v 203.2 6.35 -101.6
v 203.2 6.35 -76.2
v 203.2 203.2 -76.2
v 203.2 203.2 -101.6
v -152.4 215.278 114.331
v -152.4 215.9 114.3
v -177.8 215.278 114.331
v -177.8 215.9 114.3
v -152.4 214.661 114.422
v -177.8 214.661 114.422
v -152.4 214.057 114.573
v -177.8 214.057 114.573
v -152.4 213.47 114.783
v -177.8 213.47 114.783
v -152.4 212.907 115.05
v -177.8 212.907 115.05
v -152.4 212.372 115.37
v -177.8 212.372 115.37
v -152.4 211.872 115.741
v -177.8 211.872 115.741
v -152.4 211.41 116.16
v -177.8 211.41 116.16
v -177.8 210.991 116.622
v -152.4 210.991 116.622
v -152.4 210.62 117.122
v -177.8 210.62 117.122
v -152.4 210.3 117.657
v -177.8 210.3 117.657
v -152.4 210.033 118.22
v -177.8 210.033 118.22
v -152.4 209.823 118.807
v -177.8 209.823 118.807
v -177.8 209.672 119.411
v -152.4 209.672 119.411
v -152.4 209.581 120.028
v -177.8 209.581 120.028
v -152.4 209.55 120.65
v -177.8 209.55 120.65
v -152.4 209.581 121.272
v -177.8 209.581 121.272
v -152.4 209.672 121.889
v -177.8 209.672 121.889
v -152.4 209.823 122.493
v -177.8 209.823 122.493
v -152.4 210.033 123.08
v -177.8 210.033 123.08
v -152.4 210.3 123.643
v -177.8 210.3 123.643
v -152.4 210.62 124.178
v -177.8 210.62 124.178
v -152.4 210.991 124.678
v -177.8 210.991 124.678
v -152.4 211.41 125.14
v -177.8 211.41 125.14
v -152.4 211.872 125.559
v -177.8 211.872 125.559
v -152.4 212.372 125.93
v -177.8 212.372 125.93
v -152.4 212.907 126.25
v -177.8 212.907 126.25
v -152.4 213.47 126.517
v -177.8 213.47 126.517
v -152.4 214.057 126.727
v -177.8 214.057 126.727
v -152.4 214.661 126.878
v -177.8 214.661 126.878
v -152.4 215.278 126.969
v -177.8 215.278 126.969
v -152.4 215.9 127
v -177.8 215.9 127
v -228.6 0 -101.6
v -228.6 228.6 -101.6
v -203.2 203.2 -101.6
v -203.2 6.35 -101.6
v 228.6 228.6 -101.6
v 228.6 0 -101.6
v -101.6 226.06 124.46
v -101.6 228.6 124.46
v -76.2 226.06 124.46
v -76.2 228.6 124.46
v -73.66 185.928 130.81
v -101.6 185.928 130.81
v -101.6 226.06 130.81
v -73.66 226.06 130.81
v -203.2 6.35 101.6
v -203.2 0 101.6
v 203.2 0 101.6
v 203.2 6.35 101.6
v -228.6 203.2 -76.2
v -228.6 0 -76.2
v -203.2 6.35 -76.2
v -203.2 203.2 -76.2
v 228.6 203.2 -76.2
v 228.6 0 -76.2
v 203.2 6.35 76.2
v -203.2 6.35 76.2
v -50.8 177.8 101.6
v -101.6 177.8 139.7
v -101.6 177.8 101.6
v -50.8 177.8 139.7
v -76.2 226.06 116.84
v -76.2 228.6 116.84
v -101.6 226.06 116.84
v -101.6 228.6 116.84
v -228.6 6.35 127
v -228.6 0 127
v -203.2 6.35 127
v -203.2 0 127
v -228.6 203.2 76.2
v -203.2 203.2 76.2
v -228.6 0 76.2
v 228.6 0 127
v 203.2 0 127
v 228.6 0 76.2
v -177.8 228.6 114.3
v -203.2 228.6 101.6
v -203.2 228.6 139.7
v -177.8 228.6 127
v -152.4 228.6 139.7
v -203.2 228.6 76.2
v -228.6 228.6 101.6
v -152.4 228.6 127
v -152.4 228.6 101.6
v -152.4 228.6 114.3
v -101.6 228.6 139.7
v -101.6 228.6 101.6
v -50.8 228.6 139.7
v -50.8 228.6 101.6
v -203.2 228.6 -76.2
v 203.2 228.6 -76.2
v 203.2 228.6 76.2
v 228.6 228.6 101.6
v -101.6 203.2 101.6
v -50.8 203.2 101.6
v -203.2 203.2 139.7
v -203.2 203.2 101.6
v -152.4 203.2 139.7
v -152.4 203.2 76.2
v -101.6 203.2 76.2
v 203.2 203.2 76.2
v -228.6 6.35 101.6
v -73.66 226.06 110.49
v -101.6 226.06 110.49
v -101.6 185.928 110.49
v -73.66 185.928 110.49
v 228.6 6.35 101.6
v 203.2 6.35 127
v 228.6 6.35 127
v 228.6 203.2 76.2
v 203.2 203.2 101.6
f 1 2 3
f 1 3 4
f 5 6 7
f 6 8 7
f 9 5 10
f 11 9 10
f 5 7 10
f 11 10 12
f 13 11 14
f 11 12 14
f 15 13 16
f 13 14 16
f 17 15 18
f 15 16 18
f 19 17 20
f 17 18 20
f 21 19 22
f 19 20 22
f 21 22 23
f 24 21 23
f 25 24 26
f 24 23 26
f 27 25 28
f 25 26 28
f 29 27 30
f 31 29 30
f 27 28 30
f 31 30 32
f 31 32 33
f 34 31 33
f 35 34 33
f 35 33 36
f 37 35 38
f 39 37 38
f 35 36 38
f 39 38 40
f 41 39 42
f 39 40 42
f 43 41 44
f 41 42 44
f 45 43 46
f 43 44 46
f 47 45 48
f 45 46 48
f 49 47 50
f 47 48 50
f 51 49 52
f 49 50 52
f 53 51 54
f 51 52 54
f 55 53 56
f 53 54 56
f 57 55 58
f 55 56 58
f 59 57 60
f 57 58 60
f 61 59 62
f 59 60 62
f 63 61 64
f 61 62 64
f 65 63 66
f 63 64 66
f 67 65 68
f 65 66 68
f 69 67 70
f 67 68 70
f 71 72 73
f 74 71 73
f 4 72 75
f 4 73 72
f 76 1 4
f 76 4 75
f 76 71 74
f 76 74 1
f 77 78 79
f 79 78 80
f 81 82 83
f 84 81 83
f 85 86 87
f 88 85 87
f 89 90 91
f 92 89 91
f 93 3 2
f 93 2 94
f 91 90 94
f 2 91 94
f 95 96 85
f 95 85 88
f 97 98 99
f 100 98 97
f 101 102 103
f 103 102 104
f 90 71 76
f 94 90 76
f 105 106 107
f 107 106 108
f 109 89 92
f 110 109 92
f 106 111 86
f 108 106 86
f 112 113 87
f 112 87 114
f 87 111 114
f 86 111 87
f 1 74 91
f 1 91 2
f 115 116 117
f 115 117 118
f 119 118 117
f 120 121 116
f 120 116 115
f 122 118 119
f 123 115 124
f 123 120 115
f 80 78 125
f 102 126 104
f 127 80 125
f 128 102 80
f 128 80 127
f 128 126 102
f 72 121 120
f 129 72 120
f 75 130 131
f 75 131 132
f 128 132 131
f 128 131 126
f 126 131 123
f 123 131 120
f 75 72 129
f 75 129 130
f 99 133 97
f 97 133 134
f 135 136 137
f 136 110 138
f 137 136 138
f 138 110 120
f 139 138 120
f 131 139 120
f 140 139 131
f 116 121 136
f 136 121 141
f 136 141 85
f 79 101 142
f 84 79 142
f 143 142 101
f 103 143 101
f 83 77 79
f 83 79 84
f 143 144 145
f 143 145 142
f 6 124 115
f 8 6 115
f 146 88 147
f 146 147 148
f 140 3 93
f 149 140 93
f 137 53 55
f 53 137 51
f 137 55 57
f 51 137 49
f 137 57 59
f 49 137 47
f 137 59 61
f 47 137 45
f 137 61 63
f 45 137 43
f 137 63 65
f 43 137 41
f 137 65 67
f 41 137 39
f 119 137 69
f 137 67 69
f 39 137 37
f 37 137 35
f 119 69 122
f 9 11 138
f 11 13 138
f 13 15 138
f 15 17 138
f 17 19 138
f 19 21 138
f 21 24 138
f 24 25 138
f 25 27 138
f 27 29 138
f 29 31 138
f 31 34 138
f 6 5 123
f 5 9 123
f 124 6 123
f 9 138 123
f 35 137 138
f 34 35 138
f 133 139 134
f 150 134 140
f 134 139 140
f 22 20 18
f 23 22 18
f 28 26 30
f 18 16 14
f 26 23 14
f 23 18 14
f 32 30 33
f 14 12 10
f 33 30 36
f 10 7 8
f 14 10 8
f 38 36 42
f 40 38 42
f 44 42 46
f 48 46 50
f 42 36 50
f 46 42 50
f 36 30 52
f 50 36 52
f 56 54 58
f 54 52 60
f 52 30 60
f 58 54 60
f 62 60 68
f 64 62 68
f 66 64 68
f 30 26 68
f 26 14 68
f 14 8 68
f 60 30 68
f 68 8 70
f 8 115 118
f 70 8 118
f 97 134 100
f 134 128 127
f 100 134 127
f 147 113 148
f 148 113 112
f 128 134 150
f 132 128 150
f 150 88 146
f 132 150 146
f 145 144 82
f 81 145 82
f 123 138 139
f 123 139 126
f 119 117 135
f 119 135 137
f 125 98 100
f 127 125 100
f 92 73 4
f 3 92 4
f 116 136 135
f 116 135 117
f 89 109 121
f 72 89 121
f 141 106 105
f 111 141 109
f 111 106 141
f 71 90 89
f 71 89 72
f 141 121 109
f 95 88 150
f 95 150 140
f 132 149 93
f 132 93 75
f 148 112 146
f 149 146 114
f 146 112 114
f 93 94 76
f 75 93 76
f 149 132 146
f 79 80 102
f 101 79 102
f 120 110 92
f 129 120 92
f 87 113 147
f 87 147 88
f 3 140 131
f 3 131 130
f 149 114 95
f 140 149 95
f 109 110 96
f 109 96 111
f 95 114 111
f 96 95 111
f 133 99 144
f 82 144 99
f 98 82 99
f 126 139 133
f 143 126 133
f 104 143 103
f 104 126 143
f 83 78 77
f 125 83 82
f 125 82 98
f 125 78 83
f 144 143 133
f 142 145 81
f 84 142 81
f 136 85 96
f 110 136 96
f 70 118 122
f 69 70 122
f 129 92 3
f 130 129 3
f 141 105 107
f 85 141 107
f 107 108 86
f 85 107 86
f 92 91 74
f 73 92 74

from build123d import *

# Parameters (mm, degrees)
SKETCH1_W                      = 25.4
SKETCH1_H                      = 25.4
SKETCH1_W_2                    = 406.4
BOSS_EXTRUDE1_DEPTH            = 6.35
SKETCH1_4_W                    = 25.4
SKETCH1_4_H                    = 25.4
BOSS_EXTRUDE2_DEPTH            = 228.6
BOSS_EXTRUDE3_START            = 203.2
SKETCH1_5_W                    = 406.4
SKETCH1_5_H                    = 25.4
SKETCH1_5_W_2                  = 25.4
SKETCH1_5_H_2                  = 152.4
BOSS_EXTRUDE3_DEPTH            = 25.4
SKETCH2_W                      = 50.8
SKETCH2_H                      = 25.4
BOSS_EXTRUDE4_DEPTH            = 38.1
F_1_2_0_5_DIAMETER_HOLE1_D     = 12.7
F_1_2_0_5_DIAMETER_HOLE1_DEPTH = 25.4
SKETCH5_W                      = 50.8
SKETCH5_H                      = 38.1
BOSS_EXTRUDE5_DEPTH            = 25.4
SKETCH6_W                      = 20.32
SKETCH6_H                      = 40.132
CUT_EXTRUDE1_DEPTH             = 27.94
CUT_EXTRUDE2_DEPTH             = 12.7
CUT_EXTRUDE3_DEPTH             = 12.7
CUT_EXTRUDE4_START             = -76.2
CUT_EXTRUDE4_DEPTH             = 50.8


with BuildPart() as part:
    # Sketch1 → Boss-Extrude1 (new body)
    with BuildSketch(Plane(origin=(0, 0, 0), x_dir=(1, 0, 0), z_dir=(0, 1, 0))):
        with Locations((-215.9, -88.9)):
            Rectangle(SKETCH1_W, SKETCH1_H)
        with Locations((-215.9, -114.3)):
            Rectangle(SKETCH1_W, SKETCH1_H)
        with Locations((0, -88.9)):
            Rectangle(SKETCH1_W_2, SKETCH1_H)
        with Locations((215.9, -88.9)):
            Rectangle(SKETCH1_W, SKETCH1_H)
        with Locations((215.9, -114.3)):
            Rectangle(SKETCH1_W, SKETCH1_H)
        with Locations((0, 88.9)):
            Rectangle(SKETCH1_W_2, SKETCH1_H)
    extrude(amount=BOSS_EXTRUDE1_DEPTH)

    # Sketch1<4> → Boss-Extrude2 (add)
    with BuildSketch(Plane(origin=(0, 0, 0), x_dir=(1, 0, 0), z_dir=(0, 1, 0))):
        with Locations((-215.9, -88.9)):
            Rectangle(SKETCH1_4_W, SKETCH1_4_H)
        with Locations((215.9, -88.9)):
            Rectangle(SKETCH1_4_W, SKETCH1_4_H)
        with Locations((215.9, 88.9)):
            Rectangle(SKETCH1_4_W, SKETCH1_4_H)
        with Locations((-215.9, 88.9)):
            Rectangle(SKETCH1_4_W, SKETCH1_4_H)
    extrude(amount=BOSS_EXTRUDE2_DEPTH)

    # Sketch1<5> → Boss-Extrude3 (add)
    with BuildSketch(Plane(origin=(0, 0, 0), x_dir=(1, 0, 0), z_dir=(0, 1, 0)).offset(BOSS_EXTRUDE3_START)):
        with Locations((0, 88.9)):
            Rectangle(SKETCH1_5_W, SKETCH1_5_H)
        with Locations((0, -88.9)):
            Rectangle(SKETCH1_5_W, SKETCH1_5_H)
        with Locations((-215.9, 0)):
            Rectangle(SKETCH1_5_W_2, SKETCH1_5_H_2)
        with Locations((215.9, 0)):
            Rectangle(SKETCH1_5_W_2, SKETCH1_5_H_2)
    extrude(amount=BOSS_EXTRUDE3_DEPTH)

    # Sketch2 → Boss-Extrude4 (add)
    with BuildSketch(Plane.XY.offset(101.6)):
        with Locations((-177.8, 215.9)):
            Rectangle(SKETCH2_W, SKETCH2_H)
        with Locations((-76.2, 215.9)):
            Rectangle(SKETCH2_W, SKETCH2_H)
    extrude(amount=BOSS_EXTRUDE4_DEPTH)

    # 1/2 (0.5) Diameter Hole1
    with Locations(Plane(origin=(-152.4, 0, 0), x_dir=(0, 0, -1), z_dir=(1, 0, 0))):
        with Locations((-120.65, 215.9)):
            Hole(F_1_2_0_5_DIAMETER_HOLE1_D / 2, depth=F_1_2_0_5_DIAMETER_HOLE1_DEPTH)

    # Sketch5 → Boss-Extrude5 (add)
    with BuildSketch(Plane.XZ.offset(-203.2)):
        with Locations((-76.2, 120.65)):
            Rectangle(SKETCH5_W, SKETCH5_H)
    extrude(amount=BOSS_EXTRUDE5_DEPTH)

    # Sketch6 → Cut-Extrude1 (cut)
    with BuildSketch(Plane.ZY.offset(101.6)):
        with Locations((120.65, 205.994)):
            Rectangle(SKETCH6_W, SKETCH6_H)
    extrude(amount=-CUT_EXTRUDE1_DEPTH, mode=Mode.SUBTRACT)

    # Sketch7 → Cut-Extrude2 (cut)
    with BuildSketch(Plane(origin=(0, 228.6, 0), x_dir=(1, 0, 0), z_dir=(0, 1, 0))):
        Polygon((-152.4, -127), (-152.4, -114.3), (-177.8, -114.3), (-177.8, -120.65), (-177.8, -127), align=None)
    extrude(amount=-CUT_EXTRUDE2_DEPTH, mode=Mode.SUBTRACT)

    # Sketch8 → Cut-Extrude3 (cut)
    with BuildSketch(Plane(origin=(0, 228.6, 0), x_dir=(1, 0, 0), z_dir=(0, 1, 0))):
        Polygon((-101.6, -124.46), (-76.2, -124.46), (-76.2, -120.65), (-76.2, -116.84), (-101.6, -116.84), (-101.6, -120.65), align=None)
    extrude(amount=-CUT_EXTRUDE3_DEPTH, mode=Mode.SUBTRACT)

    # Sketch9 → Cut-Extrude4 (cut)
    with BuildSketch(Plane.ZY.offset(228.6).offset(CUT_EXTRUDE4_START)):
        Polygon((76.2, 203.2), (101.6, 228.6), (101.6, 203.2), align=None)
    extrude(amount=-CUT_EXTRUDE4_DEPTH, mode=Mode.SUBTRACT)


solid = part.part
